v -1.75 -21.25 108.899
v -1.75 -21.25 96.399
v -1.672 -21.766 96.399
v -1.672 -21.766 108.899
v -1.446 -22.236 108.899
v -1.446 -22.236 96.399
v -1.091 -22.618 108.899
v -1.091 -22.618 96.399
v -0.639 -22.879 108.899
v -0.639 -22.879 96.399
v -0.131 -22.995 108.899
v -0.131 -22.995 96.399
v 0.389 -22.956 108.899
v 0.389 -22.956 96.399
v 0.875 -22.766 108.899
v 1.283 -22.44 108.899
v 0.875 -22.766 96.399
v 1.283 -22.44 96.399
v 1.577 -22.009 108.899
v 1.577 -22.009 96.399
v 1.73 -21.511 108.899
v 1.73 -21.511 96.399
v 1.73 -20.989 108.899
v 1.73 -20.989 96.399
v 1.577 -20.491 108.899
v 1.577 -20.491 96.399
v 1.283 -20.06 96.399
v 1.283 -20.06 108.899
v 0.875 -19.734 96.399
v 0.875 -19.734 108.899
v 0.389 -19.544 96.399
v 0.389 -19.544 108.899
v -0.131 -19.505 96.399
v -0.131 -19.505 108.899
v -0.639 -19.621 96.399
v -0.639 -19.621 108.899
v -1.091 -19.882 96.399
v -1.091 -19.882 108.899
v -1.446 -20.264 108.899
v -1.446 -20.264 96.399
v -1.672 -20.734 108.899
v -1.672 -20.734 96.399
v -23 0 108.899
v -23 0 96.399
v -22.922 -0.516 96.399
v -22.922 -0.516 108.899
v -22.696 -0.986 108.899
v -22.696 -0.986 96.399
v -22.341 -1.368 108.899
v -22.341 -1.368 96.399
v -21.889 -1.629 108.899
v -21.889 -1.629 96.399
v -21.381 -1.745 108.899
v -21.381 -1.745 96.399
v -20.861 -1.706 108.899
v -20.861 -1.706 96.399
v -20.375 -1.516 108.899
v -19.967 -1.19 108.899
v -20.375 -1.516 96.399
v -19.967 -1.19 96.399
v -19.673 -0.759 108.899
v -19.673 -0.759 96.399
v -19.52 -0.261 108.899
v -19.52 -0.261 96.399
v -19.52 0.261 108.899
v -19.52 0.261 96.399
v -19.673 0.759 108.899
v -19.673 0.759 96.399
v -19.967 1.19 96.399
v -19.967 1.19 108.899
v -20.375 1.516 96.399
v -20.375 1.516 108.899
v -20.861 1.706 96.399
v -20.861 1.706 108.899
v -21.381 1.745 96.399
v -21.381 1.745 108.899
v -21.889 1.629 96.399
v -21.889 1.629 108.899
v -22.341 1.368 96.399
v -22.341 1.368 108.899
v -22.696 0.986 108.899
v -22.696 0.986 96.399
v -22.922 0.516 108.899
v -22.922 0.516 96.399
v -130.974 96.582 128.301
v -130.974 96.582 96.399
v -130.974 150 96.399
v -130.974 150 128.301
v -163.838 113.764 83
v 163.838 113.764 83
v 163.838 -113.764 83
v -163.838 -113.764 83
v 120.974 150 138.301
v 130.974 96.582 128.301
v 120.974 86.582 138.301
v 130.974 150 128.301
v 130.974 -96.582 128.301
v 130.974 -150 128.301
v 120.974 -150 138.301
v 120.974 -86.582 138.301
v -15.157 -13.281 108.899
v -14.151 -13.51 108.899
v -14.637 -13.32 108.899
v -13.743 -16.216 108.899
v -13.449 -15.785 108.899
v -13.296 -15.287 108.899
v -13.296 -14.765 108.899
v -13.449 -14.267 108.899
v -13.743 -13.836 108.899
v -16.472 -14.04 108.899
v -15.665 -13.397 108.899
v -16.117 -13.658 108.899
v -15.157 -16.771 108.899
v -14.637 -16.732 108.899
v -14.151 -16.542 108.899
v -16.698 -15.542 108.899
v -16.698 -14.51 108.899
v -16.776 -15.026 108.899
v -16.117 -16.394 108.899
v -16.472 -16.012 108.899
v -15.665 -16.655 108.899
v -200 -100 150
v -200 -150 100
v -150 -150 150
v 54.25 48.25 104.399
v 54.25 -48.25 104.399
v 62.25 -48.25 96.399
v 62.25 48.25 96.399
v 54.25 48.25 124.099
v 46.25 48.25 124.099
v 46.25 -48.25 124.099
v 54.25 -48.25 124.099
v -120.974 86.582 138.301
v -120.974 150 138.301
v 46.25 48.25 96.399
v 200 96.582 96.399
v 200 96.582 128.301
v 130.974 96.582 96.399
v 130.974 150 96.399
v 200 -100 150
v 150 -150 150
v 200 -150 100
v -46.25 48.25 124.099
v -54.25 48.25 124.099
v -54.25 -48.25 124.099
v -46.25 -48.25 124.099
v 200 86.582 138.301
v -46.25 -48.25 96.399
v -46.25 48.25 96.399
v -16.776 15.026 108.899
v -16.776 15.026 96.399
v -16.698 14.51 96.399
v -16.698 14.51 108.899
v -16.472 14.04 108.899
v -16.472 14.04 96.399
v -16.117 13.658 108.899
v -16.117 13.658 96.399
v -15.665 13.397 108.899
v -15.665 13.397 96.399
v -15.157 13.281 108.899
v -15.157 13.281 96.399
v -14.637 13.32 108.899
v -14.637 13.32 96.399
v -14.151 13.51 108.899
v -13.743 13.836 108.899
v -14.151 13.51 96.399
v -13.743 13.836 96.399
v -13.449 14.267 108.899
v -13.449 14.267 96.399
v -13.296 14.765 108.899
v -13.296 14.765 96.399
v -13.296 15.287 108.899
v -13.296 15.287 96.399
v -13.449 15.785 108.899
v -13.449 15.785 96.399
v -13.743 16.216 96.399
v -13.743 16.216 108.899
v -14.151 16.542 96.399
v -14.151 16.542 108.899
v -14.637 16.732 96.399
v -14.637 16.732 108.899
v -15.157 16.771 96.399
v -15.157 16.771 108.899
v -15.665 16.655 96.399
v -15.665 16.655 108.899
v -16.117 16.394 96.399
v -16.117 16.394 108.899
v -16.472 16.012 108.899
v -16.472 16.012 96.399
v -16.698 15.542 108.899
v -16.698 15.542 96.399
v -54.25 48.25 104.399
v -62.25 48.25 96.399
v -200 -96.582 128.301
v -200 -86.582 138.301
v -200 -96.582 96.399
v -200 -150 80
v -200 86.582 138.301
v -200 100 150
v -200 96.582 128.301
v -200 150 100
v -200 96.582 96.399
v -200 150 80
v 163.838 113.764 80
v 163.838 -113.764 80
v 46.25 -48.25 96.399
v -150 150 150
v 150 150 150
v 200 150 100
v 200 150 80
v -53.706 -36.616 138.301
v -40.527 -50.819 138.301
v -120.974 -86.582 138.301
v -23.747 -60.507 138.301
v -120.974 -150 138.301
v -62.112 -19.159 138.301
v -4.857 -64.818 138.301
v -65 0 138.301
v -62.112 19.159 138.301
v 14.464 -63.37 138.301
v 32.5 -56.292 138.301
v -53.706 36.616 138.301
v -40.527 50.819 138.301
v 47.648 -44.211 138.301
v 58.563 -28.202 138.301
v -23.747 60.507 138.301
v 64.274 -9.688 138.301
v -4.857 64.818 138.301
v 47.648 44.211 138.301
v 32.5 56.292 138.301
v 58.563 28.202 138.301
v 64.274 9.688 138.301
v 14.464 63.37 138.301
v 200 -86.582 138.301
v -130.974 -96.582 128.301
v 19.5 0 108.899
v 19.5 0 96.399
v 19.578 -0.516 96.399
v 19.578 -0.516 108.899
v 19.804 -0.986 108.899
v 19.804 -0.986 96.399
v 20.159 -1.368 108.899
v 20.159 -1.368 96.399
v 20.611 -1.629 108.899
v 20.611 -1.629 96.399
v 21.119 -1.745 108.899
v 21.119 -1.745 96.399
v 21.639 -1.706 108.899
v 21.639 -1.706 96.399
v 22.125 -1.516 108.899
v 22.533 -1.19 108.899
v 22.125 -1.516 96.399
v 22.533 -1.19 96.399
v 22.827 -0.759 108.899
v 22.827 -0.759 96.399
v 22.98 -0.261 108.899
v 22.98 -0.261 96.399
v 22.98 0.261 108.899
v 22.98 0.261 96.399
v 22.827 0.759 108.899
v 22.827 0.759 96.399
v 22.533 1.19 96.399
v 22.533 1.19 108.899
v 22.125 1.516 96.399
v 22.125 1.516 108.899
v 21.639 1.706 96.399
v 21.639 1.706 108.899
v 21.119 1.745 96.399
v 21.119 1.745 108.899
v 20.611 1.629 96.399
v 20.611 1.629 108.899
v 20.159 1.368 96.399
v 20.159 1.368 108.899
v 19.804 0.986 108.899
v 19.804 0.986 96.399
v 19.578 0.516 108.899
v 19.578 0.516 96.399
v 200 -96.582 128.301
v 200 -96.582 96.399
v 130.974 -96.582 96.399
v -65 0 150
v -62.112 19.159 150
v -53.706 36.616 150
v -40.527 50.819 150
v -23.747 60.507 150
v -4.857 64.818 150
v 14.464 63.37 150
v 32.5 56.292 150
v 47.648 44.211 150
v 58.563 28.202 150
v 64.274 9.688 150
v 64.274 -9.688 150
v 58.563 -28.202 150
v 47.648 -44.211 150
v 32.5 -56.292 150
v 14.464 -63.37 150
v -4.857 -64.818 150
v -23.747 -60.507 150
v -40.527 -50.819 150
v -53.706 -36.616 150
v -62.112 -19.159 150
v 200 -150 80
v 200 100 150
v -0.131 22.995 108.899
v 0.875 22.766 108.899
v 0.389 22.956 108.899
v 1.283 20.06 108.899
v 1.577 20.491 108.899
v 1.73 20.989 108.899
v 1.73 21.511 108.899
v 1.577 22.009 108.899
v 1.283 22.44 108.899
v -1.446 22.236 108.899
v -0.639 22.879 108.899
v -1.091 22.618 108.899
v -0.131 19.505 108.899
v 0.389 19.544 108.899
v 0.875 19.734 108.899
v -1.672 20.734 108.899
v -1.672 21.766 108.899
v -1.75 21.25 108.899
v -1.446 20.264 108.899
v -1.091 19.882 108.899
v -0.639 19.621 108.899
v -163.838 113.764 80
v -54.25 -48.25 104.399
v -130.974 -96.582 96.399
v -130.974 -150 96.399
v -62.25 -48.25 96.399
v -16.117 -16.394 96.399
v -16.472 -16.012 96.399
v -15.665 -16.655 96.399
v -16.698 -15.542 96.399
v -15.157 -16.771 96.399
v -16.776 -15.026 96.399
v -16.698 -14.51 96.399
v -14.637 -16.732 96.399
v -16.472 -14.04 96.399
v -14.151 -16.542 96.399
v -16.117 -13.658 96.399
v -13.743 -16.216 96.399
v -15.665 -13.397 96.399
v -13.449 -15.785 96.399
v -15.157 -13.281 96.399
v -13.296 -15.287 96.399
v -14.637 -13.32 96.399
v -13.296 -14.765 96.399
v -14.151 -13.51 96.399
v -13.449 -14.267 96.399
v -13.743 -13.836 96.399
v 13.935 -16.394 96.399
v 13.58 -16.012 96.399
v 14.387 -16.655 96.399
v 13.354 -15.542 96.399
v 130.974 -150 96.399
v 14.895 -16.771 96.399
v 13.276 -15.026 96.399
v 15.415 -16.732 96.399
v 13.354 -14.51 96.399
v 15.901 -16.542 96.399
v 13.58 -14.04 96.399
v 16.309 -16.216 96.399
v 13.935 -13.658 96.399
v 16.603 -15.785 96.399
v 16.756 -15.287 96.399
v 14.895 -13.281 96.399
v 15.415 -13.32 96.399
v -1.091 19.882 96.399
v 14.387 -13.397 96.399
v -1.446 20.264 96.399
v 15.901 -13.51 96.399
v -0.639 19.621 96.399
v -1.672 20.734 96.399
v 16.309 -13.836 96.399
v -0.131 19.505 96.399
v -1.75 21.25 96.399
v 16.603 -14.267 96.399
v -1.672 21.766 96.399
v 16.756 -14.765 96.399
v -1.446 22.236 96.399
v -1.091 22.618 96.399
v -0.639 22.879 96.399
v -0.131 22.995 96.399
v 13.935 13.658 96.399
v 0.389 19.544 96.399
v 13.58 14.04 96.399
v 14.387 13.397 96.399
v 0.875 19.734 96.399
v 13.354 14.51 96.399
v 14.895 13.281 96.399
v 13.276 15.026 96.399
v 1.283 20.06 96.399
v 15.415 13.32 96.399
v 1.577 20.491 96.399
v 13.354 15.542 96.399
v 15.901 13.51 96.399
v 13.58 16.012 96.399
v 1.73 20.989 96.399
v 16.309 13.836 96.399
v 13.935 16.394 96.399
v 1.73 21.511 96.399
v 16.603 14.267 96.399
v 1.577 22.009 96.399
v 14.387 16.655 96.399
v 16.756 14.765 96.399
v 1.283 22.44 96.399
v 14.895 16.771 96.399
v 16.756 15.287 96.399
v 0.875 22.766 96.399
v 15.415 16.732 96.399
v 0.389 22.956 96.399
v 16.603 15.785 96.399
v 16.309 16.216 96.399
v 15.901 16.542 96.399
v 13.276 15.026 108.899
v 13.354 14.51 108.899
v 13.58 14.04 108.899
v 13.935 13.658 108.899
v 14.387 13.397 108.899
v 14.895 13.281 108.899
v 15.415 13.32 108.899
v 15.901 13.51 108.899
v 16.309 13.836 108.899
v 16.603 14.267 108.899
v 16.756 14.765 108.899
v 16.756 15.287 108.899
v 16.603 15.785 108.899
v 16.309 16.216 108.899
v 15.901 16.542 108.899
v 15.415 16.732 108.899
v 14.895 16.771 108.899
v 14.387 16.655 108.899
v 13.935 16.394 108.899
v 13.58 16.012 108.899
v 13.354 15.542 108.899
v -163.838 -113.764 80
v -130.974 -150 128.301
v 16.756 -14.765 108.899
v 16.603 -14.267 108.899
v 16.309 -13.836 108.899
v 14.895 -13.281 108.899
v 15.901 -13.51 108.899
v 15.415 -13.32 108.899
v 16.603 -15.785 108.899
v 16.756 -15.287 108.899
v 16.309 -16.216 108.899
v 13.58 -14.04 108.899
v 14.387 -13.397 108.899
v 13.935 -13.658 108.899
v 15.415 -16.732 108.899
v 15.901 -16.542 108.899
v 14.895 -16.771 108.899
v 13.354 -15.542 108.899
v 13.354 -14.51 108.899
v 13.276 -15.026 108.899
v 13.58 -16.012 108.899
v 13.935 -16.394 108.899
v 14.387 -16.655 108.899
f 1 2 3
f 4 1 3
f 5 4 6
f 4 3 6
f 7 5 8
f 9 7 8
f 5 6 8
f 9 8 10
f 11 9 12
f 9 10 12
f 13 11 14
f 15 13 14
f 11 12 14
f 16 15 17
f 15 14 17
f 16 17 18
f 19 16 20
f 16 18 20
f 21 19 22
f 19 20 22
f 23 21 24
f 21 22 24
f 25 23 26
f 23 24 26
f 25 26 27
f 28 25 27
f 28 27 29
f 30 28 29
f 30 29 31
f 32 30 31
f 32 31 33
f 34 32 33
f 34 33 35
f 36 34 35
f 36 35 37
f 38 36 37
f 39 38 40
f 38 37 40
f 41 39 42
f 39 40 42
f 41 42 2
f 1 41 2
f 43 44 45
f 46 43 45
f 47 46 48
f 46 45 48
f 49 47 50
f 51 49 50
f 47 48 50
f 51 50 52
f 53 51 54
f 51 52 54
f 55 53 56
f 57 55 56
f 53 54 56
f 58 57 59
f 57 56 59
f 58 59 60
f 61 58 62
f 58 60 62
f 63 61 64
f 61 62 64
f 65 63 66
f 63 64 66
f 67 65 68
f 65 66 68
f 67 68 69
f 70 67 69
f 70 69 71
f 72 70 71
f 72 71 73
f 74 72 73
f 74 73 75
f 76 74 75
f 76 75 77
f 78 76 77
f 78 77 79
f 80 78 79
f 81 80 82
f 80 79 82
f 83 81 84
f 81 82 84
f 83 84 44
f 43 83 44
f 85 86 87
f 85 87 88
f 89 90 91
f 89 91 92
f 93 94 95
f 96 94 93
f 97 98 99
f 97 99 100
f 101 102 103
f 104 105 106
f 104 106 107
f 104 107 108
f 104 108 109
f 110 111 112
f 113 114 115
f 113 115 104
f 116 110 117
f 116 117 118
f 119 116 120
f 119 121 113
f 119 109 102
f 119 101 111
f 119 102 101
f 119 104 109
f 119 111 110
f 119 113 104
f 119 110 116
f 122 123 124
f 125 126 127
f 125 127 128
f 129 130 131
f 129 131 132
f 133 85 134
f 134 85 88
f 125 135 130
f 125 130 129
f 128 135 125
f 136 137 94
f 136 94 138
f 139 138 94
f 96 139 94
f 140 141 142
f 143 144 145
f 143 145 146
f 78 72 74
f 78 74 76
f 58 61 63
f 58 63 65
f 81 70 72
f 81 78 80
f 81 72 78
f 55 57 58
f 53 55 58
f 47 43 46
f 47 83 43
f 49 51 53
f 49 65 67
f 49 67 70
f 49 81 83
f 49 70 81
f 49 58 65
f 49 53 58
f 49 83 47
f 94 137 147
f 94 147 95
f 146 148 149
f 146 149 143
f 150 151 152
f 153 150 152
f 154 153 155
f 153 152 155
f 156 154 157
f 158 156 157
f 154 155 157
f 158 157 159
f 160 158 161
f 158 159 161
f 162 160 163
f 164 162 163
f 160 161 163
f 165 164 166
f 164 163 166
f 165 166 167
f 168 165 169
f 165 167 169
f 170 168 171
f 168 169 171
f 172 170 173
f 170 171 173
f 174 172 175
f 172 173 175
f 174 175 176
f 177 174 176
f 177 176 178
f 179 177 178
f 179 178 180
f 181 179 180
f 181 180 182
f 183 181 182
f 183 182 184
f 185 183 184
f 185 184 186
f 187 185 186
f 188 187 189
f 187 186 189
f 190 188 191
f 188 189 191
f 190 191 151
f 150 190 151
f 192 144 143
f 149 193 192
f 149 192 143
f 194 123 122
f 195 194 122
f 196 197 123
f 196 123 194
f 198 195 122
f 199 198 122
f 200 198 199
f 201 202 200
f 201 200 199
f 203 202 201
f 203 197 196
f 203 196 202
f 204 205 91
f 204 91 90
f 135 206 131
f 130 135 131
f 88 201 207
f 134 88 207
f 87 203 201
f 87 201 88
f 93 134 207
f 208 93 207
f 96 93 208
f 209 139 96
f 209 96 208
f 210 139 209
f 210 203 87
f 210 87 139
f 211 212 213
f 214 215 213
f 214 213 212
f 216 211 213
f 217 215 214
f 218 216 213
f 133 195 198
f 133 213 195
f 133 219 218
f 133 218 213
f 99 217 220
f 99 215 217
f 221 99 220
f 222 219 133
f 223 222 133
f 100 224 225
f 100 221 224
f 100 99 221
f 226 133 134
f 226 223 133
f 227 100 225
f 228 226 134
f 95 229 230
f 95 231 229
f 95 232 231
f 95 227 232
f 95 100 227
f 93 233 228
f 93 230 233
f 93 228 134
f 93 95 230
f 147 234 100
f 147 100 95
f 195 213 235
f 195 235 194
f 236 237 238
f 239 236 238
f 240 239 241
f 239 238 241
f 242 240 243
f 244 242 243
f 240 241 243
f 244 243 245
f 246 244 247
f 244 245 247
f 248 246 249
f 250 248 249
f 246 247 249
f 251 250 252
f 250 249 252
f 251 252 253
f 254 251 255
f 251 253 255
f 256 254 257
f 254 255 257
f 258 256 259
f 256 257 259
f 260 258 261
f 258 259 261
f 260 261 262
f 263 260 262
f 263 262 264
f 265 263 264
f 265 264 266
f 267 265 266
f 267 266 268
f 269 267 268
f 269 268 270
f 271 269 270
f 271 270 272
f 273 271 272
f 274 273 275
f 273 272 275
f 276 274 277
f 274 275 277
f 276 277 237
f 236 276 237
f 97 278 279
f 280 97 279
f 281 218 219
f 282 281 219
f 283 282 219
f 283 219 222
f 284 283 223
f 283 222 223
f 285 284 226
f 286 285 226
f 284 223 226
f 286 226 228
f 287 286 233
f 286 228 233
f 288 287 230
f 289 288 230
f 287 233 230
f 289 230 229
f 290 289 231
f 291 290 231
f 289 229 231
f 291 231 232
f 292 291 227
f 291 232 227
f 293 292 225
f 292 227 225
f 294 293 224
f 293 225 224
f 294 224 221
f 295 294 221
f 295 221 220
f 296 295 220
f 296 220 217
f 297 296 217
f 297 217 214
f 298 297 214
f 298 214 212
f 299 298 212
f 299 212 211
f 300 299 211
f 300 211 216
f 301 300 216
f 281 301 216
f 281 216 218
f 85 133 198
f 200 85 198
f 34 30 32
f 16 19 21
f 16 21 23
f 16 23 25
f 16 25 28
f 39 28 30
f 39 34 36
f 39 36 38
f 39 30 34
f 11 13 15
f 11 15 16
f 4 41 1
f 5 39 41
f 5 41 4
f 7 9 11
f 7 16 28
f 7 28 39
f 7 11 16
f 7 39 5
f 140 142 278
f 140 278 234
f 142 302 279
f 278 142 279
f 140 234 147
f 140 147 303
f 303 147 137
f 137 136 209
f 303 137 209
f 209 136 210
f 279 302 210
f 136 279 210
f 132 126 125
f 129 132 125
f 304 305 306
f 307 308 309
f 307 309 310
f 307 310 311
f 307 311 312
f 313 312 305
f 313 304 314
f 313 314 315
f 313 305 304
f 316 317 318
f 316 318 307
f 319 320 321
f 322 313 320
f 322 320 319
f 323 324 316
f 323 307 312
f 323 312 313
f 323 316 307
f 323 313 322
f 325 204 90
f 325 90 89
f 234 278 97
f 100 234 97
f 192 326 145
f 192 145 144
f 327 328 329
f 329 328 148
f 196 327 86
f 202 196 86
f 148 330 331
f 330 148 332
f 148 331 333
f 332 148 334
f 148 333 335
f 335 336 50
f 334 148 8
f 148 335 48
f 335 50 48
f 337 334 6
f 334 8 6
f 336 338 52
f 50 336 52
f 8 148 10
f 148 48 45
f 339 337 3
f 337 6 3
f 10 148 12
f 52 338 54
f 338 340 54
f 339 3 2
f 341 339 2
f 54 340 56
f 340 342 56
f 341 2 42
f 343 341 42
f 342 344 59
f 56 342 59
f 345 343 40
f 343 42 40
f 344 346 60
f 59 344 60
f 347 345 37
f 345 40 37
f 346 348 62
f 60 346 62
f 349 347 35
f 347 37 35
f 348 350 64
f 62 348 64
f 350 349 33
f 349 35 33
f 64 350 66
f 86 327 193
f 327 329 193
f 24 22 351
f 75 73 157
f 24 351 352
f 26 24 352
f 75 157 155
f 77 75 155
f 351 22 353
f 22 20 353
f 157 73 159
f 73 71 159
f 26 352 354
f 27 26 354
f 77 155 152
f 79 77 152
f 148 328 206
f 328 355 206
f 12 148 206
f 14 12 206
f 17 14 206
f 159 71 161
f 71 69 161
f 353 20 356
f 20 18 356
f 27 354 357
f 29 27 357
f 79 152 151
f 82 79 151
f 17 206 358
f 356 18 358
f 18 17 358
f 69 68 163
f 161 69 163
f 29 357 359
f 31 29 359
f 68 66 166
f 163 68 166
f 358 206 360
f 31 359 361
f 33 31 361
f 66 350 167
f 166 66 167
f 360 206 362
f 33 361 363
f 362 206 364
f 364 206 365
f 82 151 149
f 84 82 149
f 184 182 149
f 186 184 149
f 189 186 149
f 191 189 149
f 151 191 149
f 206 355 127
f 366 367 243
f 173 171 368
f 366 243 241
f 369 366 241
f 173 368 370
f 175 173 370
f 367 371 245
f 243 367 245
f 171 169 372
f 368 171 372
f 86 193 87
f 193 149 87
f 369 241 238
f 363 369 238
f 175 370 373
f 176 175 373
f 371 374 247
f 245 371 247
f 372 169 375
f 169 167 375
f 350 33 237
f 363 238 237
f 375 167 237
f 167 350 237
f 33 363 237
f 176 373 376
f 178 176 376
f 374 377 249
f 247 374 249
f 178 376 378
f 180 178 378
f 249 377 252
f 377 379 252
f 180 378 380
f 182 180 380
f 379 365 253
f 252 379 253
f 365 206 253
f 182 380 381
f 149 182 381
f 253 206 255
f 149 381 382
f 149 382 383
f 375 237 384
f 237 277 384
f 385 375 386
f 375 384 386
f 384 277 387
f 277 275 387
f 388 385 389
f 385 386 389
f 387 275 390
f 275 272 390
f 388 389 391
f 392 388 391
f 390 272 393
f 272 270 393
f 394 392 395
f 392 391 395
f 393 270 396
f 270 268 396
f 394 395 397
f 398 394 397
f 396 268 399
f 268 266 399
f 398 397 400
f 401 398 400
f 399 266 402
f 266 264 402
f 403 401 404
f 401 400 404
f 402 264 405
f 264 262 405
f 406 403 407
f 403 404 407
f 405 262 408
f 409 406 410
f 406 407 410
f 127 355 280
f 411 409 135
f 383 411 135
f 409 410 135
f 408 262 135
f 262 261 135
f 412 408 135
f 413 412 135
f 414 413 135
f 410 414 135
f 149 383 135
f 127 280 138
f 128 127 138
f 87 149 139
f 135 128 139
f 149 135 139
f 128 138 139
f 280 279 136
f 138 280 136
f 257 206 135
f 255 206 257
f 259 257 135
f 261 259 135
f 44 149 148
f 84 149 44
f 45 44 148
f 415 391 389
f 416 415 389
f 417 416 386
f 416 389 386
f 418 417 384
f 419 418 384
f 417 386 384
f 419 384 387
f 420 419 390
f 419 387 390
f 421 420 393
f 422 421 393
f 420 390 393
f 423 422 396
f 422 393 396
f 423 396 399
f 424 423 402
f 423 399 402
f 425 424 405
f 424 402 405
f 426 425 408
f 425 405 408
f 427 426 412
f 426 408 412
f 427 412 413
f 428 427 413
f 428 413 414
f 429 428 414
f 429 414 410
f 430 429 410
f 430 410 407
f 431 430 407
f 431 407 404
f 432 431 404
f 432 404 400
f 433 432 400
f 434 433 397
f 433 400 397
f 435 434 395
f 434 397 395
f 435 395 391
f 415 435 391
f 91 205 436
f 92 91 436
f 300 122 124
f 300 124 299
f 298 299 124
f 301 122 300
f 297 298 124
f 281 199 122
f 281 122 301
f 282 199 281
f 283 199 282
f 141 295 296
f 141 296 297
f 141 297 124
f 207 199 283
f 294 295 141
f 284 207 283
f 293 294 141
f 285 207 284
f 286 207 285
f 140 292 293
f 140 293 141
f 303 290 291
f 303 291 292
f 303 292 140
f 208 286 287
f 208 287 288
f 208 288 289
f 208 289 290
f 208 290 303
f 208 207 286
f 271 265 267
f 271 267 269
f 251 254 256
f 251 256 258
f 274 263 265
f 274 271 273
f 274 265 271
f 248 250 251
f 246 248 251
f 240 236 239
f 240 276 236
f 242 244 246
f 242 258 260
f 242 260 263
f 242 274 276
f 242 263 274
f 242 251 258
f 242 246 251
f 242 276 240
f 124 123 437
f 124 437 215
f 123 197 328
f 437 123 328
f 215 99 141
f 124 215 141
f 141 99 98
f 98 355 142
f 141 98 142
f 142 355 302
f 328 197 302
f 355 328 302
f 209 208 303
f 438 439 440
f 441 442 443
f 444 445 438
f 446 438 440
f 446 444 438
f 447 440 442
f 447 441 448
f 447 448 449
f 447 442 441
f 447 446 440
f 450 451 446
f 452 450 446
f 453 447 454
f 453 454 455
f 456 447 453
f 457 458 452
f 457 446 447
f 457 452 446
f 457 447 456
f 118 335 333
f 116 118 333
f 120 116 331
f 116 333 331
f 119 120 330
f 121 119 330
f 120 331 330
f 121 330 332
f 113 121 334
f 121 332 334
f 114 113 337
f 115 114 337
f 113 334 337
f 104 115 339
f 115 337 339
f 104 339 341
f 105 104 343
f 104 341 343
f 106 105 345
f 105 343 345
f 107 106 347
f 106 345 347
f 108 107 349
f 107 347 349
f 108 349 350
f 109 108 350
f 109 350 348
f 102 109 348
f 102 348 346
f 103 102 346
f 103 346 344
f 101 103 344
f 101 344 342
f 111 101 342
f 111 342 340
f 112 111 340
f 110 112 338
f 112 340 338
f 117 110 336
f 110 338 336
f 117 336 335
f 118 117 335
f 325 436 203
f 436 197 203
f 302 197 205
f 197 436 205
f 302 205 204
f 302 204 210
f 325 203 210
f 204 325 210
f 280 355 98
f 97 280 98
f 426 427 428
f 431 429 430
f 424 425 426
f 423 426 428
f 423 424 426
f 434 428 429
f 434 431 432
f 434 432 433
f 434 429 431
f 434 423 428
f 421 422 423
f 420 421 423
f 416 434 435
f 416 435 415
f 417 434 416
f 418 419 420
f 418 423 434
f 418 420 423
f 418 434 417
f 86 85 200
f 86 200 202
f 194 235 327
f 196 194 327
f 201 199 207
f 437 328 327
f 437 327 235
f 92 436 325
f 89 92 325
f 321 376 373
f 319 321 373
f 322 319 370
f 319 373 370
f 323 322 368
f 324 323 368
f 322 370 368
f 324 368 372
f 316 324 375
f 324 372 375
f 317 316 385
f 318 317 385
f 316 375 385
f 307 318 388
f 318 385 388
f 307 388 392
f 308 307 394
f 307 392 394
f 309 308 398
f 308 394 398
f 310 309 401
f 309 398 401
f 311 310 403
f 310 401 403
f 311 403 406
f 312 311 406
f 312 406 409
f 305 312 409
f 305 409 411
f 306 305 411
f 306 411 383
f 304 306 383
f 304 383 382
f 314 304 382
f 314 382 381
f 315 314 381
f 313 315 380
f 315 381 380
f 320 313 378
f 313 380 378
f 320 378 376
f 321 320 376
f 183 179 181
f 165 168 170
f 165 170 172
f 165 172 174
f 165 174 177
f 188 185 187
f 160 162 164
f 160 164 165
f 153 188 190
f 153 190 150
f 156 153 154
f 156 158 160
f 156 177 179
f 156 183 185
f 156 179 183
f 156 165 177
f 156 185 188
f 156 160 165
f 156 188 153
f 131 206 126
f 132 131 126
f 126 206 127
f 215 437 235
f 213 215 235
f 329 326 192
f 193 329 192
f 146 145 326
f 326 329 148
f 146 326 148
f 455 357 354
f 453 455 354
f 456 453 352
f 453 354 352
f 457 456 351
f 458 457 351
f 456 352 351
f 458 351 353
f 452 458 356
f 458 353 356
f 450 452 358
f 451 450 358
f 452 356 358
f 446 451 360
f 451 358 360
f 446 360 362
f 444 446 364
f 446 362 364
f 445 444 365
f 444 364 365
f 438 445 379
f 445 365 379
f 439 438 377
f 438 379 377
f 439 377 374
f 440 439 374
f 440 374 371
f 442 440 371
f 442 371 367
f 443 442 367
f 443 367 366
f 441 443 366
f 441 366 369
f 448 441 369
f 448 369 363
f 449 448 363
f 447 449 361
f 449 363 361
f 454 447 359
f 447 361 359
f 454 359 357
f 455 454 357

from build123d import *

# Parameters (mm, degrees)
SKETCH_4_W           = 400
SKETCH_4_H           = 300
EXTRUDE_1_DEPTH      = 150
SKETCH_5_R           = 48.25
CUT_EXTRUDE_1_DEPTH  = 42.3
SKETCH_6_W           = 96.5
SKETCH_6_H           = 19.3
CUT_EXTRUDE_2_DEPTH  = 391.512483795
CUT_EXTRUDE_3_DEPTH  = 453.769256907
SKETCH_8_W           = 326
SKETCH_8_H           = 226
CUT_EXTRUDE_5_DEPTH  = 10
SKETCH_9_R           = 48.25
CUT_EXTRUDE_6_DEPTH  = 10
CHAMFER_START        = 259.807621135
CHAMFER_1_OUTLINE_W  = 65
CHAMFER_1_OUTLINE_H  = 74
CHAMFER_1_DEPTH      = 30.192378865
CHAMFER_START_2      = -290
CHAMFER_2_OUTLINE_W  = 64
CHAMFER_2_OUTLINE_H  = 74
CHAMFER_2_DEPTH      = 30.192378865
CHAMFER_3_OUTLINE_W  = 64
CHAMFER_3_OUTLINE_H  = 74
CHAMFER_3_DEPTH      = 30.192378865
CHAMFER_4_OUTLINE_W  = 65
CHAMFER_4_OUTLINE_H  = 74
CHAMFER_4_DEPTH      = 30.192378865
SKETCH_10_W          = 400
SKETCH_10_H          = 50
CUT_EXTRUDE_7_DEPTH  = 391.512483795
SKETCH_11_W          = 340
SKETCH_11_H          = 240
CUT_EXTRUDE_8_DEPTH  = 10
SKETCH_12_W          = 400
SKETCH_12_H          = 30
CUT_EXTRUDE_9_DEPTH  = 391.512483795
SKETCH_13_W          = 41.9021645
SKETCH_13_H          = 193.164300696
SKETCH_13_W_2        = 19.3
SKETCH_13_H_2        = 96.5
CUT_EXTRUDE_10_DEPTH = 453.769256907
SKETCH_14_W          = 261.947815576
SKETCH_14_H          = 41.9021645
SKETCH_14_W_2        = 96.5
SKETCH_14_H_2        = 19.3
CUT_EXTRUDE_11_DEPTH = 391.512483795
SKETCH_16_R          = 65
SKETCH_16_R_2        = 48.25
CUT_EXTRUDE_12_DEPTH = 257.708036866
CHAMFER_5_SIZE       = 10
SKETCH_17_W          = 10
SKETCH_17_H          = 96.5
EXTRUDE_4_DEPTH      = 27.7
SKETCH_19_R          = 1.75
EXTRUDE_6_DEPTH      = 12.5
SKETCH_20_W          = 2
SKETCH_20_H          = 27.7
CUT_EXTRUDE_13_DEPTH = 320.065921872
CHAMFER_6_SIZE       = 8
SKETCH_21_W          = 327.675165592
SKETCH_21_H          = 227.528194438
CUT_EXTRUDE_14_DEPTH = 3


with BuildPart() as part:
    # 草图4 → 凸台-拉伸1 (new body)
    with BuildSketch(Plane.XY):
        Rectangle(SKETCH_4_W, SKETCH_4_H)
    extrude(amount=EXTRUDE_1_DEPTH)

    # 草图5 → 切除-拉伸1 (cut)
    with BuildSketch(Plane.XY.offset(150)):
        Circle(SKETCH_5_R)
    extrude(amount=-CUT_EXTRUDE_1_DEPTH, mode=Mode.SUBTRACT)

    # 草图6 → 切除-拉伸2 (cut, through all)
    with BuildSketch(Plane.XZ.offset(150)):
        with Locations((0, 117.35)):
            Rectangle(SKETCH_6_W, SKETCH_6_H)
    extrude(amount=-CUT_EXTRUDE_2_DEPTH, mode=Mode.SUBTRACT)

    # 草图7 → 切除-拉伸3 (cut, through all)
    with BuildSketch(Plane.ZY.offset(200)):
        Polygon((127, -48.25), (107.7, -48.25), (107.7, 48.25), (127, 48.25), (127, 0), align=None)
    extrude(amount=-CUT_EXTRUDE_3_DEPTH, mode=Mode.SUBTRACT)

    # 草图8 → 切除-拉伸5 (cut)
    with BuildSketch(Plane(origin=(0, 0, 0), x_dir=(-1, 0, 0), z_dir=(0, 0, -1))):
        Rectangle(SKETCH_8_W, SKETCH_8_H)
    extrude(amount=-CUT_EXTRUDE_5_DEPTH, mode=Mode.SUBTRACT)

    # 草图9 → 切除-拉伸6 (cut)
    with BuildSketch(Plane.XY.offset(107.7)):
        Circle(SKETCH_9_R)
    extrude(amount=-CUT_EXTRUDE_6_DEPTH, mode=Mode.SUBTRACT)

    # 倒角1: read off the stored shape, not the designer's step
    # 倒角1 outline → 倒角1 (cut)
    with BuildSketch(Plane(origin=(0, 0, 0), x_dir=(0.8164965809277258, -0.40824829046386313, -0.40824829046386313), z_dir=(0.5773502691896258, 0.5773502691896258, 0.5773502691896258)).offset(CHAMFER_START)):
        with Locations((30.5, 0)):
            Rectangle(CHAMFER_1_OUTLINE_W, CHAMFER_1_OUTLINE_H)
    extrude(amount=CHAMFER_1_DEPTH, mode=Mode.SUBTRACT)

    # 倒角2: read off the stored shape, not the designer's step
    # 倒角2 outline → 倒角2 (cut)
    with BuildSketch(Plane(origin=(0, 0, 0), x_dir=(0.8164965809277258, 0.40824829046386313, 0.40824829046386313), z_dir=(0.5773502691896258, -0.5773502691896258, -0.5773502691896258)).offset(CHAMFER_START_2)):
        with Locations((-31, 0)):
            Rectangle(CHAMFER_2_OUTLINE_W, CHAMFER_2_OUTLINE_H)
    extrude(amount=CHAMFER_2_DEPTH, mode=Mode.SUBTRACT)

    # 倒角3: read off the stored shape, not the designer's step
    # 倒角3 outline → 倒角3 (cut)
    with BuildSketch(Plane(origin=(0, 0, 0), x_dir=(0.8164965809277258, -0.40824829046386313, 0.40824829046386313), z_dir=(0.5773502691896258, 0.5773502691896258, -0.5773502691896258)).offset(CHAMFER_START_2)):
        with Locations((-31, 0)):
            Rectangle(CHAMFER_3_OUTLINE_W, CHAMFER_3_OUTLINE_H)
    extrude(amount=CHAMFER_3_DEPTH, mode=Mode.SUBTRACT)

    # 倒角4: read off the stored shape, not the designer's step
    # 倒角4 outline → 倒角4 (cut)
    with BuildSketch(Plane(origin=(0, 0, 0), x_dir=(0.8164965809277258, 0.40824829046386313, -0.40824829046386313), z_dir=(0.5773502691896258, -0.5773502691896258, 0.5773502691896258)).offset(CHAMFER_START)):
        with Locations((30.5, 0)):
            Rectangle(CHAMFER_4_OUTLINE_W, CHAMFER_4_OUTLINE_H)
    extrude(amount=CHAMFER_4_DEPTH, mode=Mode.SUBTRACT)

    # 草图10 → 切除-拉伸7 (cut, through all)
    with BuildSketch(Plane(origin=(0, 150, 0), x_dir=(1, 0, 0), z_dir=(0, 1, 0))):
        with Locations((0, -25)):
            Rectangle(SKETCH_10_W, SKETCH_10_H)
    extrude(amount=-CUT_EXTRUDE_7_DEPTH, mode=Mode.SUBTRACT)

    # 草图11 → 切除-拉伸8 (cut)
    with BuildSketch(Plane(origin=(0, 0, 50), x_dir=(-1, 0, 0), z_dir=(0, 0, -1))):
        Rectangle(SKETCH_11_W, SKETCH_11_H)
    extrude(amount=-CUT_EXTRUDE_8_DEPTH, mode=Mode.SUBTRACT)

    # 草图12 → 切除-拉伸9 (cut, through all)
    with BuildSketch(Plane(origin=(0, 150, 0), x_dir=(1, 0, 0), z_dir=(0, 1, 0))):
        with Locations((0, -65)):
            Rectangle(SKETCH_12_W, SKETCH_12_H)
    extrude(amount=-CUT_EXTRUDE_9_DEPTH, mode=Mode.SUBTRACT)

    # 草图13 → 切除-拉伸10 (cut, through all)
    with BuildSketch(Plane(origin=(200, 0, 0), x_dir=(0, 0, -1), z_dir=(1, 0, 0))):
        with Locations((-117.35, 0)):
            Rectangle(SKETCH_13_W, SKETCH_13_H)
        with Locations((-117.35, 0)):
            Rectangle(SKETCH_13_W_2, SKETCH_13_H_2, mode=Mode.SUBTRACT)
    extrude(amount=-CUT_EXTRUDE_10_DEPTH, mode=Mode.SUBTRACT)

    # 草图14 → 切除-拉伸11 (cut, through all)
    with BuildSketch(Plane.XZ.offset(150)):
        with Locations((0, 117.35)):
            Rectangle(SKETCH_14_W, SKETCH_14_H)
        with Locations((0, 117.35)):
            Rectangle(SKETCH_14_W_2, SKETCH_14_H_2, mode=Mode.SUBTRACT)
    extrude(amount=-CUT_EXTRUDE_11_DEPTH, mode=Mode.SUBTRACT)

    # 草图16 → 切除-拉伸12 (cut, through all)
    with BuildSketch(Plane(origin=(0, 0, 138.30108225), x_dir=(-1, 0, 0), z_dir=(0, 0, -1))):
        Circle(SKETCH_16_R)
        Circle(SKETCH_16_R_2, mode=Mode.SUBTRACT)
    extrude(amount=-CUT_EXTRUDE_12_DEPTH, mode=Mode.SUBTRACT)

    # 倒角5
    chamfer_5_edges = [part.edges().sort_by_distance(p)[0] for p in [
        (-165.486953894, -96.582150348, 138.30108225),
        (-165.486953894, 96.582150348, 138.30108225),
        (165.486953894, -96.582150348, 138.30108225),
        (165.486953894, 96.582150348, 138.30108225),
        (-130.973907788, 123.291075174, 138.30108225),
        (130.973907788, 123.291075174, 138.30108225),
        (130.973907788, -123.291075174, 138.30108225),
        (-130.973907788, -123.291075174, 138.30108225),
    ]]
    chamfer(chamfer_5_edges, length=CHAMFER_5_SIZE)

    # 草图17 → 凸台-拉伸4 (add)
    with BuildSketch(Plane.XY.offset(96.39891775)):
        with Locations((49.25, 0)):
            Rectangle(SKETCH_17_W, SKETCH_17_H)
        with Locations((-49.25, 0)):
            Rectangle(SKETCH_17_W, SKETCH_17_H)
    extrude(amount=EXTRUDE_4_DEPTH)

    # 草图19 → 凸台-拉伸6 (add)
    with BuildSketch(Plane.XY.offset(96.39891775)):
        with Locations(Location((-15.0260191, -15.0260191, 0), (0, 0, 180))):
            Circle(SKETCH_19_R)
        with Locations(Location((-21.25, 0, 0), (0, 0, 180))):
            Circle(SKETCH_19_R)
        with Locations(Location((-15.0260191, 15.0260191, 0), (0, 0, 180))):
            Circle(SKETCH_19_R)
        with Locations(Location((15.0260191, 15.0260191, 0), (0, 0, 180))):
            Circle(SKETCH_19_R)
        with Locations(Location((21.25, 0, 0), (0, 0, 180))):
            Circle(SKETCH_19_R)
        with Locations(Location((15.0260191, -15.0260191, 0), (0, 0, 180))):
            Circle(SKETCH_19_R)
        with Locations(Location((0, -21.25, 0), (0, 0, 180))):
            Circle(SKETCH_19_R)
        with Locations(Location((0, 21.25, 0), (0, 0, 180))):
            Circle(SKETCH_19_R)
    extrude(amount=EXTRUDE_6_DEPTH)

    # 草图20 → 切除-拉伸13 (cut, through all)
    with BuildSketch(Plane.XZ.offset(48.25)):
        with Locations((-45.25, 110.24891775)):
            Rectangle(SKETCH_20_W, SKETCH_20_H)
        with Locations((45.25, 110.24891775)):
            Rectangle(SKETCH_20_W, SKETCH_20_H)
    extrude(amount=-CUT_EXTRUDE_13_DEPTH, mode=Mode.SUBTRACT)

    # 倒角6
    chamfer_6_edges = [part.edges().sort_by_distance(p)[0] for p in [
        (54.25, 0, 96.39891775),
        (-54.25, 0, 96.39891775),
    ]]
    chamfer(chamfer_6_edges, length=CHAMFER_6_SIZE)

    # 草图21 → 切除-拉伸14 (cut)
    with BuildSketch(Plane(origin=(0, 0, 80), x_dir=(-1, 0, 0), z_dir=(0, 0, -1))):
        Rectangle(SKETCH_21_W, SKETCH_21_H)
    extrude(amount=-CUT_EXTRUDE_14_DEPTH, mode=Mode.SUBTRACT)


solid = part.part
